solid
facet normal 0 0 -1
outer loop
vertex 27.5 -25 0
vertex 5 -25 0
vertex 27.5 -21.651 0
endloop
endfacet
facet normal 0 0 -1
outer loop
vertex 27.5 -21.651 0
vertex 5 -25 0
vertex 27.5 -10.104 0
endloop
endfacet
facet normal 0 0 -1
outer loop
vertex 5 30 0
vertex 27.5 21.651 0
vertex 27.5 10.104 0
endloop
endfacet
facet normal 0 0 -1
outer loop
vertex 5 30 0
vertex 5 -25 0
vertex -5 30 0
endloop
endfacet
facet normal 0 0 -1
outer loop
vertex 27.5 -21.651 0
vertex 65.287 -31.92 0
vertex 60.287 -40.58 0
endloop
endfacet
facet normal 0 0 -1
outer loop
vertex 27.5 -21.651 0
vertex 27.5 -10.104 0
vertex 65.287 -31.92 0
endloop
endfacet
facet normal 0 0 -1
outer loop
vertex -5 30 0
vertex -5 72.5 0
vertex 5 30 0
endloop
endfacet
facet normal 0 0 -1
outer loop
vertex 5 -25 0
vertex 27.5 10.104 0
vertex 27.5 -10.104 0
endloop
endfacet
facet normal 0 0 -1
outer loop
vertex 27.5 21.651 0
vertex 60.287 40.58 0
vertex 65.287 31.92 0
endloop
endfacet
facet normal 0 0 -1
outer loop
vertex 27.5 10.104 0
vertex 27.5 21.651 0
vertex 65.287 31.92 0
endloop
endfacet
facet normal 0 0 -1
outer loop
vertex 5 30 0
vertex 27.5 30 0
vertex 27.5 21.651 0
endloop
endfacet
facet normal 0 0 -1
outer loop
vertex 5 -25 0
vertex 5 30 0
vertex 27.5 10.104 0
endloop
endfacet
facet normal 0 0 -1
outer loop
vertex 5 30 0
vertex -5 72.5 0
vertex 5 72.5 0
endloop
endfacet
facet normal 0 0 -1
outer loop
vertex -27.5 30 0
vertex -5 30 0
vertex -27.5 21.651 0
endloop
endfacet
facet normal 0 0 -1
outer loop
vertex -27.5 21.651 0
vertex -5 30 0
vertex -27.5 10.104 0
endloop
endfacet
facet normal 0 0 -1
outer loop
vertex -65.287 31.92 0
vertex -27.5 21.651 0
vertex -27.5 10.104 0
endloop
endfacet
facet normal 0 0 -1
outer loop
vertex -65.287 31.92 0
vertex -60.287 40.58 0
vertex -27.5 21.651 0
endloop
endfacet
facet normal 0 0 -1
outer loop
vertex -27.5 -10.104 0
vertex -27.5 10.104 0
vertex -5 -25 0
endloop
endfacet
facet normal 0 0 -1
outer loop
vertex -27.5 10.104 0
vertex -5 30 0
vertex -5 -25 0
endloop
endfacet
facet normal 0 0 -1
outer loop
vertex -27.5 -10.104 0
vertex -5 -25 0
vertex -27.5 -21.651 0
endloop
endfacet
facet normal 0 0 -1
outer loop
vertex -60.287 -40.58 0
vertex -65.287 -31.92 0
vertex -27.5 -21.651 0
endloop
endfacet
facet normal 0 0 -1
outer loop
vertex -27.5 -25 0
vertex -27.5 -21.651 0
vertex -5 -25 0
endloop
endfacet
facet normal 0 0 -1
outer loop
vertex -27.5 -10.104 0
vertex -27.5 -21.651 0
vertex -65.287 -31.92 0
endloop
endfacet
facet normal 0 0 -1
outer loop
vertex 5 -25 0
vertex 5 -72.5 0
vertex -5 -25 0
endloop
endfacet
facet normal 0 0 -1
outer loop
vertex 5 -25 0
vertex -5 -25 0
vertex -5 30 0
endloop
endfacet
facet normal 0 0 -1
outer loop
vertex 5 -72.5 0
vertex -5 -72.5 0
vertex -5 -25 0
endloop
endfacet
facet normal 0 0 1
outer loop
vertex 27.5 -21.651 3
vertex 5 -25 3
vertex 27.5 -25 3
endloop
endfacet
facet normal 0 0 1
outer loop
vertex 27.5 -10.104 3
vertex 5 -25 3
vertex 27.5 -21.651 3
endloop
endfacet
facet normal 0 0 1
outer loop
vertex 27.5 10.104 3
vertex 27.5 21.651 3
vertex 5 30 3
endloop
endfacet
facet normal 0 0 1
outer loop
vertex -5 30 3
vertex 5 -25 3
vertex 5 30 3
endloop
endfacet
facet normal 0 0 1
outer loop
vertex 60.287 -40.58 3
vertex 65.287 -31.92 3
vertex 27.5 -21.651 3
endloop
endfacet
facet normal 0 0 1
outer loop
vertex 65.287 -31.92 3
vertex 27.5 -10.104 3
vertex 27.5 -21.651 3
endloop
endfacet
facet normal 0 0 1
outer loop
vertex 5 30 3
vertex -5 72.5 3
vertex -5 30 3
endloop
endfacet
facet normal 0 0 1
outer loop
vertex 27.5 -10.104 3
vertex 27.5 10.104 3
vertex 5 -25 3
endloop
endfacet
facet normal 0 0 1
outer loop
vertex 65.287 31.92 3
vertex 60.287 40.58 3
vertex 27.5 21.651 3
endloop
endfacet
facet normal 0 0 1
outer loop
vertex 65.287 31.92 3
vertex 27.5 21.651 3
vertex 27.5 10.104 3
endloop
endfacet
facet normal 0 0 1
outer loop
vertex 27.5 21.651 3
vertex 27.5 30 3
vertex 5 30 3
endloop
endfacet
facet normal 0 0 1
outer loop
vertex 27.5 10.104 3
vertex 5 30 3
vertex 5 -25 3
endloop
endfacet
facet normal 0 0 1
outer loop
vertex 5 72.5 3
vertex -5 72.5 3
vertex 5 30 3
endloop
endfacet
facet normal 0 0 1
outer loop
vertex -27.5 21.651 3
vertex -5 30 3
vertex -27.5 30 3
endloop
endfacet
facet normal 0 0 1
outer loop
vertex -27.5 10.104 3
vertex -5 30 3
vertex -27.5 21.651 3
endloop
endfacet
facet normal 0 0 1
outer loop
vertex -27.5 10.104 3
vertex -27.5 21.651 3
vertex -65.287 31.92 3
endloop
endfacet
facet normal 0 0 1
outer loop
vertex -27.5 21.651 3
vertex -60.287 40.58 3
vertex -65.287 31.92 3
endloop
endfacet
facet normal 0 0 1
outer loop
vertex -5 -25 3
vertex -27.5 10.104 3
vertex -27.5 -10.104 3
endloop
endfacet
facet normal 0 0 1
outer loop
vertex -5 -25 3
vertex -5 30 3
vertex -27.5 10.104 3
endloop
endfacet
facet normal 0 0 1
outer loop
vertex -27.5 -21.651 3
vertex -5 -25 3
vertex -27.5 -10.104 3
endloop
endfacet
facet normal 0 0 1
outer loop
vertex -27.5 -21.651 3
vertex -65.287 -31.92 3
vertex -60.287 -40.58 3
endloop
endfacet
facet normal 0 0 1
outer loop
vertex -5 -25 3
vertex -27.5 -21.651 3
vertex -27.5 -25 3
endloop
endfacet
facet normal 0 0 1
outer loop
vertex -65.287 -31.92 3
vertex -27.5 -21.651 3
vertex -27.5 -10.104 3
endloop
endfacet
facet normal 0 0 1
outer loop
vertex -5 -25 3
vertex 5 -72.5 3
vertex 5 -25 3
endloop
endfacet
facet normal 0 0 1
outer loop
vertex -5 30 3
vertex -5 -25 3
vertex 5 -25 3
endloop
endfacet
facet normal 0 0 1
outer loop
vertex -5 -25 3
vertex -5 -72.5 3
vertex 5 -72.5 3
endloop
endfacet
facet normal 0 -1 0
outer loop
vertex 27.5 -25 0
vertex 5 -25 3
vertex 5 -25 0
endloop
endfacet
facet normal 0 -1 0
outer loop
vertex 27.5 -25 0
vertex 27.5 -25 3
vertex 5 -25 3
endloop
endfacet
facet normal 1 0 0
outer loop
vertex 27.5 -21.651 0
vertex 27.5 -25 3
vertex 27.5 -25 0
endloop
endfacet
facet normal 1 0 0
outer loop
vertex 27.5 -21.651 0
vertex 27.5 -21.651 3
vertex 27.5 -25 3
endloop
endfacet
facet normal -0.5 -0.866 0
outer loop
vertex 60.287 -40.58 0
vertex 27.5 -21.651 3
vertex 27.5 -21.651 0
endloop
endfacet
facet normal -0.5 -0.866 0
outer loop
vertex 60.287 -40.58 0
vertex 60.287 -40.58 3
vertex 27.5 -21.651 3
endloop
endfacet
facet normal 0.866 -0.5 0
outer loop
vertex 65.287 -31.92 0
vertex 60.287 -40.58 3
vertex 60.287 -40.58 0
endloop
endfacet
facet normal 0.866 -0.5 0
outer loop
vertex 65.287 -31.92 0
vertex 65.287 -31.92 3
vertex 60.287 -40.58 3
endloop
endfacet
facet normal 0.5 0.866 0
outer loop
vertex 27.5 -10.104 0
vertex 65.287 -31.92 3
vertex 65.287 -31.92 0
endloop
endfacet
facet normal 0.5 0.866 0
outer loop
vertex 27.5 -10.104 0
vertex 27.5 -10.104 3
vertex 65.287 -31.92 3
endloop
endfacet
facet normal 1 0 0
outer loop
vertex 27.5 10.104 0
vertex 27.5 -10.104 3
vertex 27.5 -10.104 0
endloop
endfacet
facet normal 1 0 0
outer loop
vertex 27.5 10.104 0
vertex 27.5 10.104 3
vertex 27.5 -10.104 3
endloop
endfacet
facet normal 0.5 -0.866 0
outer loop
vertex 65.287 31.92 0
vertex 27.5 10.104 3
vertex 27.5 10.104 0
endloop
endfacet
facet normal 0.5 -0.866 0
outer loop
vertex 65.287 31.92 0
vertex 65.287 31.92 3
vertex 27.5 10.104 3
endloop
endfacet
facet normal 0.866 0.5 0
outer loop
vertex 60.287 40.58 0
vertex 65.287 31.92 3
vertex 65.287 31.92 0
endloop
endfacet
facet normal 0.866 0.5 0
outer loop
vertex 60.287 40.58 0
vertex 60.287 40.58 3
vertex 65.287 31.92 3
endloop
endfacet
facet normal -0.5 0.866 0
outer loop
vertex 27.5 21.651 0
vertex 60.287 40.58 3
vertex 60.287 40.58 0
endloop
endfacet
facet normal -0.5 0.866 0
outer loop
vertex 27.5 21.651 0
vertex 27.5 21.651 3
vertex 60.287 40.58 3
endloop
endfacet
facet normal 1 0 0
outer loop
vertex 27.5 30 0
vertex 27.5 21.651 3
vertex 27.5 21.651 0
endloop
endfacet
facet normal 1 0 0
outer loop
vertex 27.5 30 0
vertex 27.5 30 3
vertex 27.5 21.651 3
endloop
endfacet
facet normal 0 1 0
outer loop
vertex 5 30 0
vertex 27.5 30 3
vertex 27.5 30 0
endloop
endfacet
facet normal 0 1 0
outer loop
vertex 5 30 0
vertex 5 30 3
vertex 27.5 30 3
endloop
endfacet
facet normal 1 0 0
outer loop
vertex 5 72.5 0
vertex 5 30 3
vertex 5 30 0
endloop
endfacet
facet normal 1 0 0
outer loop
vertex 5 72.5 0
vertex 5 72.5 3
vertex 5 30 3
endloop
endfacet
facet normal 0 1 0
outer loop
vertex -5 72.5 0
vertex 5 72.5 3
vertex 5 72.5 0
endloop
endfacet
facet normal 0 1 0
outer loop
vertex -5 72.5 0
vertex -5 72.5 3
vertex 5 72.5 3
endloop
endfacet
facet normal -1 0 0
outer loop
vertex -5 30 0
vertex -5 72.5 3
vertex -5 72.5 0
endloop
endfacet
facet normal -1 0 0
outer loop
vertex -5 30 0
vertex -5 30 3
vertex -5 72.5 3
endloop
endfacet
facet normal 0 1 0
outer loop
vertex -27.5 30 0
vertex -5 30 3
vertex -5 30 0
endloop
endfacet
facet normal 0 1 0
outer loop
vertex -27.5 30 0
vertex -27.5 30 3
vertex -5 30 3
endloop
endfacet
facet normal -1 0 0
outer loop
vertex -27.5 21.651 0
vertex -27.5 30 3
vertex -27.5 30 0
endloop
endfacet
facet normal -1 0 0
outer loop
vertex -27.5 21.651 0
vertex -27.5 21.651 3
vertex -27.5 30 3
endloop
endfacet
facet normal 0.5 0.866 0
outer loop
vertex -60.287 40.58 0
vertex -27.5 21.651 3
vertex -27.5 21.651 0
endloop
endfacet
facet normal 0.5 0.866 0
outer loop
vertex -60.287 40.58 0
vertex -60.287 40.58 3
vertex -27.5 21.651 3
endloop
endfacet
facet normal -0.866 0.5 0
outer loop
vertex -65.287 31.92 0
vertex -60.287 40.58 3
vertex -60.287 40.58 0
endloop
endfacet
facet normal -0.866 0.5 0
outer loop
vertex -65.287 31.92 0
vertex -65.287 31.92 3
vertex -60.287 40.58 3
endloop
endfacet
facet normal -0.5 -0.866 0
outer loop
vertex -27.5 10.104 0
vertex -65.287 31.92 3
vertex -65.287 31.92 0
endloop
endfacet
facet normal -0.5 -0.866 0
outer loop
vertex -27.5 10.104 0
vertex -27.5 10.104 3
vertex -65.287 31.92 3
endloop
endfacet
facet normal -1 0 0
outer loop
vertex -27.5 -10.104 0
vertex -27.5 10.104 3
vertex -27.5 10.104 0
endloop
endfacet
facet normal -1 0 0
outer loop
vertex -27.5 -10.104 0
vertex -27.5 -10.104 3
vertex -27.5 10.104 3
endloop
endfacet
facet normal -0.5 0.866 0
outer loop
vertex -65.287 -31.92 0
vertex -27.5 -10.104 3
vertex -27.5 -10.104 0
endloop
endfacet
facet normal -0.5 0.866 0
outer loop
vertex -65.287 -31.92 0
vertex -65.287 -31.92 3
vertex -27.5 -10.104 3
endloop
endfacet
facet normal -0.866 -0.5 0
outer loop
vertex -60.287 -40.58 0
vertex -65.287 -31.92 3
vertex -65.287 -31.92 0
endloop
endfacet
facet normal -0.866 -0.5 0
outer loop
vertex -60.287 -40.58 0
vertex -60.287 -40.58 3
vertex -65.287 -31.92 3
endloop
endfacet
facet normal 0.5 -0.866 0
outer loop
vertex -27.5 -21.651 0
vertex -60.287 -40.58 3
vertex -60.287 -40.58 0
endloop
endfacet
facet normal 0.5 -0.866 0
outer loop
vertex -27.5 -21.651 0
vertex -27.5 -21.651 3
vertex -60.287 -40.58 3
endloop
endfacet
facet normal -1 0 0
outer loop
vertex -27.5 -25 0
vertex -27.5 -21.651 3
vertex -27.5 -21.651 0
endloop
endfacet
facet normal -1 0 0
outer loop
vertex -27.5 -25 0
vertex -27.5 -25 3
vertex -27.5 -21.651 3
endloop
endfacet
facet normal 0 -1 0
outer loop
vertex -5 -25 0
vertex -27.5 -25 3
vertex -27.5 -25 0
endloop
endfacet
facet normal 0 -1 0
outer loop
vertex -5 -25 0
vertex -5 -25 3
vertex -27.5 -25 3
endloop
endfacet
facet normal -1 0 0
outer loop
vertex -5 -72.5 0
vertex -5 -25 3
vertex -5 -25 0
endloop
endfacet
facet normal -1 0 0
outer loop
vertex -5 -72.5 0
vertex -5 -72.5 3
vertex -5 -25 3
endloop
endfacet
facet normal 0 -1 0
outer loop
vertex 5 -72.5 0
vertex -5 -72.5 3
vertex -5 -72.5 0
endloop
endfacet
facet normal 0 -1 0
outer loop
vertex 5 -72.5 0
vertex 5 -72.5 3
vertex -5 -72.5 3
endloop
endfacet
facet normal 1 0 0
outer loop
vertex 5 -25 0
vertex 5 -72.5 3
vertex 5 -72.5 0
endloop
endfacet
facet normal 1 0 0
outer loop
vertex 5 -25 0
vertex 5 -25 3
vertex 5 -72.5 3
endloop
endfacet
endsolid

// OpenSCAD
// TDO DRY
pillarWidth = 5;
pillarHeight = 145;

module pillarx(width, height) {
    square([width, height], center=false);
}

module pillarsx(width, height){ 
    for (angle = [0:60:360])
        rotate([0,0,angle])
        translate([0,(-height / 2),0])
        pillarx(width, height);
}


module gmHolder() {
	pcbWidth = 50;
	pcbHeight = 45;

	holderAroundPCBThickness = 5;

	color("Gold")
		linear_extrude(height = 3, convexity = 10, twist = 0) 
			union(){
				translate([-(pcbWidth + holderAroundPCBThickness)/2, -(pcbHeight + holderAroundPCBThickness)/2, 0])
					square(pcbHeight + (2*holderAroundPCBThickness), pcbWidth + (2*holderAroundPCBThickness));
				pillarsx(pillarWidth, pillarHeight);
			}
    
   // }




			//difference(){
				
			//	translate([holderAroundPCBThickness, holderAroundPCBThickness, 0])
			//		square(pcbHeight, pcbWidth);
		//	}
    

}

gmHolder();
